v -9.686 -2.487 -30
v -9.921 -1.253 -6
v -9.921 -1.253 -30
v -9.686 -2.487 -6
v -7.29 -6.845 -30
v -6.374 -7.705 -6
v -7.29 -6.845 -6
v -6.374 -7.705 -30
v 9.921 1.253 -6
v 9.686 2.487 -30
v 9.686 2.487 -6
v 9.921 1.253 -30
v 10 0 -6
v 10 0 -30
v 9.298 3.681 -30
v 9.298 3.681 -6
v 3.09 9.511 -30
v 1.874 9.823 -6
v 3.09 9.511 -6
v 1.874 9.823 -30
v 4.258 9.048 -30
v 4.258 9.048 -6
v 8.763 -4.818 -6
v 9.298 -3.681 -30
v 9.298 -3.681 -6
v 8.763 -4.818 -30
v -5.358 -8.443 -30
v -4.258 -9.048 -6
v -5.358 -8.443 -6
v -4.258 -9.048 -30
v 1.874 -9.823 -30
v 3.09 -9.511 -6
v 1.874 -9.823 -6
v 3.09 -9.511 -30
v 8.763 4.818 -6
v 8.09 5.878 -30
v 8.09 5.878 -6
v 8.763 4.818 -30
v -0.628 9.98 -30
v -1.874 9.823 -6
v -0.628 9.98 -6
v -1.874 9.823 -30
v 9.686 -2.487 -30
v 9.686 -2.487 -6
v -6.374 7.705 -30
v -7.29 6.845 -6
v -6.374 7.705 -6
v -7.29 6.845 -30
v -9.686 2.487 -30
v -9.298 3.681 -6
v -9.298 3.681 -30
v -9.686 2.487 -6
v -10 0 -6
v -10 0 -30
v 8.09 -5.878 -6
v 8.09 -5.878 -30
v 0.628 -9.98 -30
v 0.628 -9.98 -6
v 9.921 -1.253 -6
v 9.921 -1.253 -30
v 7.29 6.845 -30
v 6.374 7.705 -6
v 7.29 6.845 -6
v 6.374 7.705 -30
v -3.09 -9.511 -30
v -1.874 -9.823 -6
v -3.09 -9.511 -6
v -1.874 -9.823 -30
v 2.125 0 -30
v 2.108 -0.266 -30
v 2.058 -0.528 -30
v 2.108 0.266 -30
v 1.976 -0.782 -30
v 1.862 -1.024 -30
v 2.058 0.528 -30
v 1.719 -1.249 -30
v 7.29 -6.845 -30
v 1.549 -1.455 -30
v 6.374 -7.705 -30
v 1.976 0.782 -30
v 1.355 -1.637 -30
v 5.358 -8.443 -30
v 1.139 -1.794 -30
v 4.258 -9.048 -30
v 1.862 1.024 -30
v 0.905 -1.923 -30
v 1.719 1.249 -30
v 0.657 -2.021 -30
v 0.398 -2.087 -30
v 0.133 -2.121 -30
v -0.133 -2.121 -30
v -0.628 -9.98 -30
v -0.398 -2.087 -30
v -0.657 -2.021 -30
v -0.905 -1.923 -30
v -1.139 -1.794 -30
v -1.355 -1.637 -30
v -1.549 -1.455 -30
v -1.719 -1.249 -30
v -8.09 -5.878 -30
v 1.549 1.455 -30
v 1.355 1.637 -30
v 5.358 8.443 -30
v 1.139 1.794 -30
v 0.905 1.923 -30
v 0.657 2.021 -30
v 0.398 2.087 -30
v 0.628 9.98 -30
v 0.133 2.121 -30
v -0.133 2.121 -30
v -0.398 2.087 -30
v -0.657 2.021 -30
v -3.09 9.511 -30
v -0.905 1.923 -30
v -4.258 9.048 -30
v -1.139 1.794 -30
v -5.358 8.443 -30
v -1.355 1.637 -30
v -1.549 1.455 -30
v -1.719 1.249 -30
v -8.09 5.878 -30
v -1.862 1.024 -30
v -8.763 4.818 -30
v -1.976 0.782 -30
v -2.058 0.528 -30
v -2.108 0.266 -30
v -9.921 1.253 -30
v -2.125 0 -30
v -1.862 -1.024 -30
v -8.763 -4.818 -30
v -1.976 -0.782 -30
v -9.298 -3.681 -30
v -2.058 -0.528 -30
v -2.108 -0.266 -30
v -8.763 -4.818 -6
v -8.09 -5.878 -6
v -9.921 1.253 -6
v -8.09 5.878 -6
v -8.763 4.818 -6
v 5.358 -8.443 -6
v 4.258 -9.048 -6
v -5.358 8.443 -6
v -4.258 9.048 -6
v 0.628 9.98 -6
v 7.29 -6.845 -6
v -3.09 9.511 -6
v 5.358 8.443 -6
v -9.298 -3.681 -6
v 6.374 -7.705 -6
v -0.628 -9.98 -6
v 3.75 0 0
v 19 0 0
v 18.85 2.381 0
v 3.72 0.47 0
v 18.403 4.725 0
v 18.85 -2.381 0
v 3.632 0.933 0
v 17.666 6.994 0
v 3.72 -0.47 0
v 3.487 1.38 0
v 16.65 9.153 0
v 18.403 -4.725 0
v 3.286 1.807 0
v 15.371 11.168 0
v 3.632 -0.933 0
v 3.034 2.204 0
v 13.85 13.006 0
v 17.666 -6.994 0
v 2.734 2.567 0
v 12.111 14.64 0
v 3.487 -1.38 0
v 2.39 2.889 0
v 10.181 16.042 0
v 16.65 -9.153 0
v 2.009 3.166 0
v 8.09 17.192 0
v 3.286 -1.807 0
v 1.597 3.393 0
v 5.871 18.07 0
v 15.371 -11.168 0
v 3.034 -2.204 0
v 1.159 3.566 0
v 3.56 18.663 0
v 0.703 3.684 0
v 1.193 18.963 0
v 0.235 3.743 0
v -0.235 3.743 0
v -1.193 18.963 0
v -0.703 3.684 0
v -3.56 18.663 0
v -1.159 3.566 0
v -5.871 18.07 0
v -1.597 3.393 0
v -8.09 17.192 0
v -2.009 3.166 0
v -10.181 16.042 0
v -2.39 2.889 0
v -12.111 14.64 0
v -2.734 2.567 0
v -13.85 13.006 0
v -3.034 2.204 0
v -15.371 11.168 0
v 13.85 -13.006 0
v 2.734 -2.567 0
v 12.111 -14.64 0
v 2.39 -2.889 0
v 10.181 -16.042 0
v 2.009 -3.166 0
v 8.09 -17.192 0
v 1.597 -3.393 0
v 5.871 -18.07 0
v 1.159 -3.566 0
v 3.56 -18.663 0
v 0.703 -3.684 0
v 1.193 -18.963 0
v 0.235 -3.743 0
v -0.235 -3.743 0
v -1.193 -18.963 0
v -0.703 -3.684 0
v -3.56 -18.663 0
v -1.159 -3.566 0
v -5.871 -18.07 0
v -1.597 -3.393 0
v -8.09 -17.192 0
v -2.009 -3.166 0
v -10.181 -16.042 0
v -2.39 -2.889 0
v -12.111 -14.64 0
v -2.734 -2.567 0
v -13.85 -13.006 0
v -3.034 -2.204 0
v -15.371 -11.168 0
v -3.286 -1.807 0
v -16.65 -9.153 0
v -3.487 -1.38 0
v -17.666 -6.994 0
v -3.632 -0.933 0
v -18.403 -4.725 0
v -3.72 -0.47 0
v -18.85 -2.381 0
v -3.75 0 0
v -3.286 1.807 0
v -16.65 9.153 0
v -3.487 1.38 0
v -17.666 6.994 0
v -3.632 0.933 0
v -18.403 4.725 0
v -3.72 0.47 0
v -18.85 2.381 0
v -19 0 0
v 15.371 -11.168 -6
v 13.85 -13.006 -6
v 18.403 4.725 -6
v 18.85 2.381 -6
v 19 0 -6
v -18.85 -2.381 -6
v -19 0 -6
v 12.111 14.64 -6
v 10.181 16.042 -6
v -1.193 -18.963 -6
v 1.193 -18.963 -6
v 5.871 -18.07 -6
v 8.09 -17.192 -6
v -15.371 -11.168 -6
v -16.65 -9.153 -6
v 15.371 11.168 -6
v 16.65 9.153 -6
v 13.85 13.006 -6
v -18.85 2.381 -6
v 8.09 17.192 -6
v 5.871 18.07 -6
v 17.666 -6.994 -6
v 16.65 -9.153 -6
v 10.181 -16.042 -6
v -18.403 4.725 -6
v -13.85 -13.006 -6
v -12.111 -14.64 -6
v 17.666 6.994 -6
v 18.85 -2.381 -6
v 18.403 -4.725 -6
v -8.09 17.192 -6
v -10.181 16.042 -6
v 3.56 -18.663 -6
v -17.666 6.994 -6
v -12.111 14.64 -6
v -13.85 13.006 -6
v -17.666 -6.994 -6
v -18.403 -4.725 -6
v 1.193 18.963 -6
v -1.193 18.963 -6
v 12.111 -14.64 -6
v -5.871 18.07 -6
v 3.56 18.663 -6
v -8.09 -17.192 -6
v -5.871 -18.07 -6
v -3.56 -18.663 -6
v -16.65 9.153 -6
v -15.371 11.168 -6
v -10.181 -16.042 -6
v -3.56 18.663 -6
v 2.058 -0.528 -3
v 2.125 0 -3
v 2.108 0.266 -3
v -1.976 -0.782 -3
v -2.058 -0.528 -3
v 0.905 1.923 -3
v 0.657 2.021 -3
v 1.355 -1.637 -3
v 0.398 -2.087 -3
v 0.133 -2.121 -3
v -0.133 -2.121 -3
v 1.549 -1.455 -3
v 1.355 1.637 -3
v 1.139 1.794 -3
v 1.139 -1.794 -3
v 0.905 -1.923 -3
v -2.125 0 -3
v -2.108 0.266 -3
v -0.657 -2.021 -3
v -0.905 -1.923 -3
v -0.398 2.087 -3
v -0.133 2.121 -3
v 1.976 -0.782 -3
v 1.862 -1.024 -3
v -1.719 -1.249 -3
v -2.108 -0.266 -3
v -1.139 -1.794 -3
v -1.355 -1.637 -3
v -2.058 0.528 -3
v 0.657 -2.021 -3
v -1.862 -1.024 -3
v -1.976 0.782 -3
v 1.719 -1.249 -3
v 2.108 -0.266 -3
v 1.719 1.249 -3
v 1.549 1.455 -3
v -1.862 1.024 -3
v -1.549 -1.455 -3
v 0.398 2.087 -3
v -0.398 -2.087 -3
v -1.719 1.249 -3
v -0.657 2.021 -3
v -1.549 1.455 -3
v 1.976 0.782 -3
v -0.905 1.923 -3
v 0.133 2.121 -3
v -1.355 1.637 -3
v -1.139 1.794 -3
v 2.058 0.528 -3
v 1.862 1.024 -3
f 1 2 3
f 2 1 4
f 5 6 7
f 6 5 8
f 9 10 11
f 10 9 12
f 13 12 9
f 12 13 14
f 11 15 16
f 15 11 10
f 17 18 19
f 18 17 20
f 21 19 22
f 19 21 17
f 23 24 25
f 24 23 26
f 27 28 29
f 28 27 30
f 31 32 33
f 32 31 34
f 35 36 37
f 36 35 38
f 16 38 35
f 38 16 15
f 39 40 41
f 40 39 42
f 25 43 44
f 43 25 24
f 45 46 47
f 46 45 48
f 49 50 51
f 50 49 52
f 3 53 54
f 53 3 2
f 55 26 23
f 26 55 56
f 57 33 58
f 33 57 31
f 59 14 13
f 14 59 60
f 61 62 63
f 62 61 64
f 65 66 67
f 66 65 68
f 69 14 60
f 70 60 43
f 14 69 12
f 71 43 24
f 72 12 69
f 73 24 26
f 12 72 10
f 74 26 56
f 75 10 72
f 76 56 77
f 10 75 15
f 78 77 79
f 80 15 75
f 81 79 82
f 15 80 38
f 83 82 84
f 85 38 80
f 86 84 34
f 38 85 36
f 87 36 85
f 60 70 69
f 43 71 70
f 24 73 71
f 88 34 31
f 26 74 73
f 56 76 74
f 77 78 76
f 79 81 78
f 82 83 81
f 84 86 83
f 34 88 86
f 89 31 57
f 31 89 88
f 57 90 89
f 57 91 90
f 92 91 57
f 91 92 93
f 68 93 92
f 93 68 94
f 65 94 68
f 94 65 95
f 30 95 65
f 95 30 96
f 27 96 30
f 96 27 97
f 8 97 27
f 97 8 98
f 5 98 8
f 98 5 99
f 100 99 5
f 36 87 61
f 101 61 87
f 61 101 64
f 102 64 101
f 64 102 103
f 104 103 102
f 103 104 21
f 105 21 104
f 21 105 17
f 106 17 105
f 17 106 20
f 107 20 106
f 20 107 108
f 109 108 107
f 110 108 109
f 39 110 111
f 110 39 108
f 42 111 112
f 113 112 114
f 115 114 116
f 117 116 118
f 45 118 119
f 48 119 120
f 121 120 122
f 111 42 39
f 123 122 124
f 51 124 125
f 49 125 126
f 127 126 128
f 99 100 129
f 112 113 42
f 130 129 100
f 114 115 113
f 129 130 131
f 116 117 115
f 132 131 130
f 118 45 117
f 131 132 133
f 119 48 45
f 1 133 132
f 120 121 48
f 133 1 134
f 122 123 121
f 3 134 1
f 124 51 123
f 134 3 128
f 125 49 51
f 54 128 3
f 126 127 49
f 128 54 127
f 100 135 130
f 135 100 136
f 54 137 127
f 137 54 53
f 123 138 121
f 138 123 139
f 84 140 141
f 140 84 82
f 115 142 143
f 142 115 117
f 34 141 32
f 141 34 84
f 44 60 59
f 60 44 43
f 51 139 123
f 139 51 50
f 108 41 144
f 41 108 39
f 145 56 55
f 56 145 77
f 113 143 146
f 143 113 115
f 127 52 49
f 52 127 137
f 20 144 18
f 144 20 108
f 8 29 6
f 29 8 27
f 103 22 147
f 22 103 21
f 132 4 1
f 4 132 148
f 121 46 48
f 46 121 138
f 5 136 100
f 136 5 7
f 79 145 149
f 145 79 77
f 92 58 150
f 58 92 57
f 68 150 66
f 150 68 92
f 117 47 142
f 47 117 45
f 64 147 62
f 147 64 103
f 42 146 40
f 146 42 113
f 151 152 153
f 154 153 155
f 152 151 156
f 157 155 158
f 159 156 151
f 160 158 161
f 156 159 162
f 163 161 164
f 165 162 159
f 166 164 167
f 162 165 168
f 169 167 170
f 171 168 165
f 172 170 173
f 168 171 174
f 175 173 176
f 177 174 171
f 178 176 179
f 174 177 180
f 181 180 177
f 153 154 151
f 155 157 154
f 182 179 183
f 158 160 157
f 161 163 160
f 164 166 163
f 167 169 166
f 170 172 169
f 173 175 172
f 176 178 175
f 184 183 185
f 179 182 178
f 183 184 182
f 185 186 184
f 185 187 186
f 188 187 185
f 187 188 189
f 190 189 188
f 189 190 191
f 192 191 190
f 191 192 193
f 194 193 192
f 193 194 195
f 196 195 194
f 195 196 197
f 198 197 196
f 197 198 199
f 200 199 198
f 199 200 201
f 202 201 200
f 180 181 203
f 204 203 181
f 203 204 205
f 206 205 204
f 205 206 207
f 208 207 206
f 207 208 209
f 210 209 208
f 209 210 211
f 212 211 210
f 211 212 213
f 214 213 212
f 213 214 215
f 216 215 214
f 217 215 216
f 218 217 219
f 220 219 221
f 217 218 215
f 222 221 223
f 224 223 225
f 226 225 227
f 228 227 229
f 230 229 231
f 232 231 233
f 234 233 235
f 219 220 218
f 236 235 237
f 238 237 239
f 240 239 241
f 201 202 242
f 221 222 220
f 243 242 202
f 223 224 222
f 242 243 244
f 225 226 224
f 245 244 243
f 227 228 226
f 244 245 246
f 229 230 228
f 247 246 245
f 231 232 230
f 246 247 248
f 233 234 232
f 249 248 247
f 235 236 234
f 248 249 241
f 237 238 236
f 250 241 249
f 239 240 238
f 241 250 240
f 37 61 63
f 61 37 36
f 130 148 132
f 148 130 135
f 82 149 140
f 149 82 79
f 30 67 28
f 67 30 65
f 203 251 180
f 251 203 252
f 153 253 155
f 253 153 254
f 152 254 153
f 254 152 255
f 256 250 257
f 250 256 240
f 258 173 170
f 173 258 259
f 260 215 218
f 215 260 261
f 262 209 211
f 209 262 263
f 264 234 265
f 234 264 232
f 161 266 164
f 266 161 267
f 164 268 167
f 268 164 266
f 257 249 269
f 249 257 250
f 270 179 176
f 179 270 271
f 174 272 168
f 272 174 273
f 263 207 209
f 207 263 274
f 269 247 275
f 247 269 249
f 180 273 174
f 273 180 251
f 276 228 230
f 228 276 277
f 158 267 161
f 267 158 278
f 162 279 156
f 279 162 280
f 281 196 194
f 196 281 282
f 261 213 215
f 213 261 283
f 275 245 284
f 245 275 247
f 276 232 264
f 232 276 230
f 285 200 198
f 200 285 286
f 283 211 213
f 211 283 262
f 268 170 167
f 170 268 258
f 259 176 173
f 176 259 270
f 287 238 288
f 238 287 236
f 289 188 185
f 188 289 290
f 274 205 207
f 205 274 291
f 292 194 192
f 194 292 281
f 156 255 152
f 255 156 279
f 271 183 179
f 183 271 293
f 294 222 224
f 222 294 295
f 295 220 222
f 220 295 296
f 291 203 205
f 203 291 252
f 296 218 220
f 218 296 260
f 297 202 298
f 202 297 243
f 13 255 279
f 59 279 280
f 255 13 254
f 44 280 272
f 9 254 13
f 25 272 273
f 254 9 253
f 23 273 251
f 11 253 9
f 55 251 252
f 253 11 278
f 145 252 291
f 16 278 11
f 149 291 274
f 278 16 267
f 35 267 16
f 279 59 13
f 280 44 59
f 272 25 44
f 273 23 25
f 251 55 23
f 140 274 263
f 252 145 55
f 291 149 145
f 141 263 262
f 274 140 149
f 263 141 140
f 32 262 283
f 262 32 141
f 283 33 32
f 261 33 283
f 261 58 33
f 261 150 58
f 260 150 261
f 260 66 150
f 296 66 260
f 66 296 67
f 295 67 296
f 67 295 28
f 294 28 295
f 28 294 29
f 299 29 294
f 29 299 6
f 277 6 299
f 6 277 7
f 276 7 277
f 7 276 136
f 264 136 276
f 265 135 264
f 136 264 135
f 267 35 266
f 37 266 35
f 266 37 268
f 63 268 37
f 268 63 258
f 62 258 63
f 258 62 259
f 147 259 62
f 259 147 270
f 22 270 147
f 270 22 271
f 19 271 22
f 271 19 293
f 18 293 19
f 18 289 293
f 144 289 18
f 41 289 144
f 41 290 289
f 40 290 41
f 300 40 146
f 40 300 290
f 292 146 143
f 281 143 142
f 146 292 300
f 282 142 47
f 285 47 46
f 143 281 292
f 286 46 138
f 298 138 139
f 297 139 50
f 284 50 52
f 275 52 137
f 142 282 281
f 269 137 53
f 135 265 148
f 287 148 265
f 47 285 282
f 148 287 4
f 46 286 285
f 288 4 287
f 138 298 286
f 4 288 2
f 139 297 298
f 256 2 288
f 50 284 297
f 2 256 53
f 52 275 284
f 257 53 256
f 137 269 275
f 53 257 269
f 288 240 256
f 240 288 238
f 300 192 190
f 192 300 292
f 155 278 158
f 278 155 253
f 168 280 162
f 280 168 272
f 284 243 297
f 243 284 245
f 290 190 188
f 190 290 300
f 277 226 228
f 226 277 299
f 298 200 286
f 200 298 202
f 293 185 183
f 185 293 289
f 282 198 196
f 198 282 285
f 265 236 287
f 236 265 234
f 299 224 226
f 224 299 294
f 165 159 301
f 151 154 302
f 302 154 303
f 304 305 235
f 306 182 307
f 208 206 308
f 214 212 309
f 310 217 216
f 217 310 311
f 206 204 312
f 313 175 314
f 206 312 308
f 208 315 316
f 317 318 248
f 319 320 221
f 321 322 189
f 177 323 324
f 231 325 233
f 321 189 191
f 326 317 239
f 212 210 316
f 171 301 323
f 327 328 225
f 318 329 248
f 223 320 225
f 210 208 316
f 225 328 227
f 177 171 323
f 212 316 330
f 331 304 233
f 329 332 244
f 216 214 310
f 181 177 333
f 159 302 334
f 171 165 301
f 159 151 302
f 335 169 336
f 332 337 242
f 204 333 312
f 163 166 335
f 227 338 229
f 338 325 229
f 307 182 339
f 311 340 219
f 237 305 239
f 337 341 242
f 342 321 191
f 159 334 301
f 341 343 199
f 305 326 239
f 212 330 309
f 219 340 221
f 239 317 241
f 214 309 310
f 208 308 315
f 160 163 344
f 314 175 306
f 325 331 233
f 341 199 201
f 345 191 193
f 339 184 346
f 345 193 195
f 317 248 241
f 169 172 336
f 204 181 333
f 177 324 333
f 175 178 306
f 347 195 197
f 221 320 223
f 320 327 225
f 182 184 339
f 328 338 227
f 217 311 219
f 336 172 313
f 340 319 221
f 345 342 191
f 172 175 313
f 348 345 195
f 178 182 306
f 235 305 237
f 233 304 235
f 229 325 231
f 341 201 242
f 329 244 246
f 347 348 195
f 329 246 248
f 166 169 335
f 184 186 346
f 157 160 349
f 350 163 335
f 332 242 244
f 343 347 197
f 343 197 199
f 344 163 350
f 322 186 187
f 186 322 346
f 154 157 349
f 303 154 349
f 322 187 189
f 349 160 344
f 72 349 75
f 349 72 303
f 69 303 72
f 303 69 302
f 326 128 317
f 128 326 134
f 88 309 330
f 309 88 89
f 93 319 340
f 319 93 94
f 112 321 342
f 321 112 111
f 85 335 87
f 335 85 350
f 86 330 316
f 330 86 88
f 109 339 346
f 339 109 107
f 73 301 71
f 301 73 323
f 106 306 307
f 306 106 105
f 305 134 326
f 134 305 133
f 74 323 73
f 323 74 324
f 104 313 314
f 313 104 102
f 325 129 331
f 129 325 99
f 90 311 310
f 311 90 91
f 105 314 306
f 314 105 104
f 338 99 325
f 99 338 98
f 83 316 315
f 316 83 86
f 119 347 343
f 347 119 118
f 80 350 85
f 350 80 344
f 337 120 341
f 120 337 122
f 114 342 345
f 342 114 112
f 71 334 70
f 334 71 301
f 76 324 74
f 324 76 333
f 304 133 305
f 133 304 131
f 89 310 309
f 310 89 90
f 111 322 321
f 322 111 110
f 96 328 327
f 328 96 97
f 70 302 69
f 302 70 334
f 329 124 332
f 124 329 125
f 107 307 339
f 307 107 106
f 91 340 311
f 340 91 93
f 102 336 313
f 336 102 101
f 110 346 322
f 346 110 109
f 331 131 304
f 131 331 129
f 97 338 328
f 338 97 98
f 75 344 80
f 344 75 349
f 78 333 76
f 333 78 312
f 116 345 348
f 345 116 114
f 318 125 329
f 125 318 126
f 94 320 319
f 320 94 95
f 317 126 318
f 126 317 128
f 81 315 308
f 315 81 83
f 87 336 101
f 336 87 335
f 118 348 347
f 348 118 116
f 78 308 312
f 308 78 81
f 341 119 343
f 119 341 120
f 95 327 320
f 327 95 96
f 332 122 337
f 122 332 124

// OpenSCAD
$fn = 50;


difference() {
	union() {
		translate(v = [0, 0, -30.0000000000]) {
			cylinder(h = 30, r = 10.0000000000);
		}
		translate(v = [0, 0, -6.0000000000]) {
			cylinder(h = 6, r = 19.0000000000);
		}
	}
	union() {
		translate(v = [0, 0, 0]) {
			rotate(a = [0, 0, 0]) {
				difference() {
					union() {
						#translate(v = [0, 0, -30.0000000000]) {
							cylinder(h = 30, r = 2.0000000000);
						}
						#translate(v = [0, 0, -3]) {
							cylinder(h = 3, r = 10.0000000000, r1 = 2.1250000000, r2 = 3.7500000000);
						}
						#translate(v = [0, 0, -30.0000000000]) {
							cylinder(h = 30, r = 2.1250000000);
						}
						#translate(v = [0, 0, -30.0000000000]) {
							cylinder(h = 30, r = 2.0000000000);
						}
					}
					union();
				}
			}
		}
	}
}
